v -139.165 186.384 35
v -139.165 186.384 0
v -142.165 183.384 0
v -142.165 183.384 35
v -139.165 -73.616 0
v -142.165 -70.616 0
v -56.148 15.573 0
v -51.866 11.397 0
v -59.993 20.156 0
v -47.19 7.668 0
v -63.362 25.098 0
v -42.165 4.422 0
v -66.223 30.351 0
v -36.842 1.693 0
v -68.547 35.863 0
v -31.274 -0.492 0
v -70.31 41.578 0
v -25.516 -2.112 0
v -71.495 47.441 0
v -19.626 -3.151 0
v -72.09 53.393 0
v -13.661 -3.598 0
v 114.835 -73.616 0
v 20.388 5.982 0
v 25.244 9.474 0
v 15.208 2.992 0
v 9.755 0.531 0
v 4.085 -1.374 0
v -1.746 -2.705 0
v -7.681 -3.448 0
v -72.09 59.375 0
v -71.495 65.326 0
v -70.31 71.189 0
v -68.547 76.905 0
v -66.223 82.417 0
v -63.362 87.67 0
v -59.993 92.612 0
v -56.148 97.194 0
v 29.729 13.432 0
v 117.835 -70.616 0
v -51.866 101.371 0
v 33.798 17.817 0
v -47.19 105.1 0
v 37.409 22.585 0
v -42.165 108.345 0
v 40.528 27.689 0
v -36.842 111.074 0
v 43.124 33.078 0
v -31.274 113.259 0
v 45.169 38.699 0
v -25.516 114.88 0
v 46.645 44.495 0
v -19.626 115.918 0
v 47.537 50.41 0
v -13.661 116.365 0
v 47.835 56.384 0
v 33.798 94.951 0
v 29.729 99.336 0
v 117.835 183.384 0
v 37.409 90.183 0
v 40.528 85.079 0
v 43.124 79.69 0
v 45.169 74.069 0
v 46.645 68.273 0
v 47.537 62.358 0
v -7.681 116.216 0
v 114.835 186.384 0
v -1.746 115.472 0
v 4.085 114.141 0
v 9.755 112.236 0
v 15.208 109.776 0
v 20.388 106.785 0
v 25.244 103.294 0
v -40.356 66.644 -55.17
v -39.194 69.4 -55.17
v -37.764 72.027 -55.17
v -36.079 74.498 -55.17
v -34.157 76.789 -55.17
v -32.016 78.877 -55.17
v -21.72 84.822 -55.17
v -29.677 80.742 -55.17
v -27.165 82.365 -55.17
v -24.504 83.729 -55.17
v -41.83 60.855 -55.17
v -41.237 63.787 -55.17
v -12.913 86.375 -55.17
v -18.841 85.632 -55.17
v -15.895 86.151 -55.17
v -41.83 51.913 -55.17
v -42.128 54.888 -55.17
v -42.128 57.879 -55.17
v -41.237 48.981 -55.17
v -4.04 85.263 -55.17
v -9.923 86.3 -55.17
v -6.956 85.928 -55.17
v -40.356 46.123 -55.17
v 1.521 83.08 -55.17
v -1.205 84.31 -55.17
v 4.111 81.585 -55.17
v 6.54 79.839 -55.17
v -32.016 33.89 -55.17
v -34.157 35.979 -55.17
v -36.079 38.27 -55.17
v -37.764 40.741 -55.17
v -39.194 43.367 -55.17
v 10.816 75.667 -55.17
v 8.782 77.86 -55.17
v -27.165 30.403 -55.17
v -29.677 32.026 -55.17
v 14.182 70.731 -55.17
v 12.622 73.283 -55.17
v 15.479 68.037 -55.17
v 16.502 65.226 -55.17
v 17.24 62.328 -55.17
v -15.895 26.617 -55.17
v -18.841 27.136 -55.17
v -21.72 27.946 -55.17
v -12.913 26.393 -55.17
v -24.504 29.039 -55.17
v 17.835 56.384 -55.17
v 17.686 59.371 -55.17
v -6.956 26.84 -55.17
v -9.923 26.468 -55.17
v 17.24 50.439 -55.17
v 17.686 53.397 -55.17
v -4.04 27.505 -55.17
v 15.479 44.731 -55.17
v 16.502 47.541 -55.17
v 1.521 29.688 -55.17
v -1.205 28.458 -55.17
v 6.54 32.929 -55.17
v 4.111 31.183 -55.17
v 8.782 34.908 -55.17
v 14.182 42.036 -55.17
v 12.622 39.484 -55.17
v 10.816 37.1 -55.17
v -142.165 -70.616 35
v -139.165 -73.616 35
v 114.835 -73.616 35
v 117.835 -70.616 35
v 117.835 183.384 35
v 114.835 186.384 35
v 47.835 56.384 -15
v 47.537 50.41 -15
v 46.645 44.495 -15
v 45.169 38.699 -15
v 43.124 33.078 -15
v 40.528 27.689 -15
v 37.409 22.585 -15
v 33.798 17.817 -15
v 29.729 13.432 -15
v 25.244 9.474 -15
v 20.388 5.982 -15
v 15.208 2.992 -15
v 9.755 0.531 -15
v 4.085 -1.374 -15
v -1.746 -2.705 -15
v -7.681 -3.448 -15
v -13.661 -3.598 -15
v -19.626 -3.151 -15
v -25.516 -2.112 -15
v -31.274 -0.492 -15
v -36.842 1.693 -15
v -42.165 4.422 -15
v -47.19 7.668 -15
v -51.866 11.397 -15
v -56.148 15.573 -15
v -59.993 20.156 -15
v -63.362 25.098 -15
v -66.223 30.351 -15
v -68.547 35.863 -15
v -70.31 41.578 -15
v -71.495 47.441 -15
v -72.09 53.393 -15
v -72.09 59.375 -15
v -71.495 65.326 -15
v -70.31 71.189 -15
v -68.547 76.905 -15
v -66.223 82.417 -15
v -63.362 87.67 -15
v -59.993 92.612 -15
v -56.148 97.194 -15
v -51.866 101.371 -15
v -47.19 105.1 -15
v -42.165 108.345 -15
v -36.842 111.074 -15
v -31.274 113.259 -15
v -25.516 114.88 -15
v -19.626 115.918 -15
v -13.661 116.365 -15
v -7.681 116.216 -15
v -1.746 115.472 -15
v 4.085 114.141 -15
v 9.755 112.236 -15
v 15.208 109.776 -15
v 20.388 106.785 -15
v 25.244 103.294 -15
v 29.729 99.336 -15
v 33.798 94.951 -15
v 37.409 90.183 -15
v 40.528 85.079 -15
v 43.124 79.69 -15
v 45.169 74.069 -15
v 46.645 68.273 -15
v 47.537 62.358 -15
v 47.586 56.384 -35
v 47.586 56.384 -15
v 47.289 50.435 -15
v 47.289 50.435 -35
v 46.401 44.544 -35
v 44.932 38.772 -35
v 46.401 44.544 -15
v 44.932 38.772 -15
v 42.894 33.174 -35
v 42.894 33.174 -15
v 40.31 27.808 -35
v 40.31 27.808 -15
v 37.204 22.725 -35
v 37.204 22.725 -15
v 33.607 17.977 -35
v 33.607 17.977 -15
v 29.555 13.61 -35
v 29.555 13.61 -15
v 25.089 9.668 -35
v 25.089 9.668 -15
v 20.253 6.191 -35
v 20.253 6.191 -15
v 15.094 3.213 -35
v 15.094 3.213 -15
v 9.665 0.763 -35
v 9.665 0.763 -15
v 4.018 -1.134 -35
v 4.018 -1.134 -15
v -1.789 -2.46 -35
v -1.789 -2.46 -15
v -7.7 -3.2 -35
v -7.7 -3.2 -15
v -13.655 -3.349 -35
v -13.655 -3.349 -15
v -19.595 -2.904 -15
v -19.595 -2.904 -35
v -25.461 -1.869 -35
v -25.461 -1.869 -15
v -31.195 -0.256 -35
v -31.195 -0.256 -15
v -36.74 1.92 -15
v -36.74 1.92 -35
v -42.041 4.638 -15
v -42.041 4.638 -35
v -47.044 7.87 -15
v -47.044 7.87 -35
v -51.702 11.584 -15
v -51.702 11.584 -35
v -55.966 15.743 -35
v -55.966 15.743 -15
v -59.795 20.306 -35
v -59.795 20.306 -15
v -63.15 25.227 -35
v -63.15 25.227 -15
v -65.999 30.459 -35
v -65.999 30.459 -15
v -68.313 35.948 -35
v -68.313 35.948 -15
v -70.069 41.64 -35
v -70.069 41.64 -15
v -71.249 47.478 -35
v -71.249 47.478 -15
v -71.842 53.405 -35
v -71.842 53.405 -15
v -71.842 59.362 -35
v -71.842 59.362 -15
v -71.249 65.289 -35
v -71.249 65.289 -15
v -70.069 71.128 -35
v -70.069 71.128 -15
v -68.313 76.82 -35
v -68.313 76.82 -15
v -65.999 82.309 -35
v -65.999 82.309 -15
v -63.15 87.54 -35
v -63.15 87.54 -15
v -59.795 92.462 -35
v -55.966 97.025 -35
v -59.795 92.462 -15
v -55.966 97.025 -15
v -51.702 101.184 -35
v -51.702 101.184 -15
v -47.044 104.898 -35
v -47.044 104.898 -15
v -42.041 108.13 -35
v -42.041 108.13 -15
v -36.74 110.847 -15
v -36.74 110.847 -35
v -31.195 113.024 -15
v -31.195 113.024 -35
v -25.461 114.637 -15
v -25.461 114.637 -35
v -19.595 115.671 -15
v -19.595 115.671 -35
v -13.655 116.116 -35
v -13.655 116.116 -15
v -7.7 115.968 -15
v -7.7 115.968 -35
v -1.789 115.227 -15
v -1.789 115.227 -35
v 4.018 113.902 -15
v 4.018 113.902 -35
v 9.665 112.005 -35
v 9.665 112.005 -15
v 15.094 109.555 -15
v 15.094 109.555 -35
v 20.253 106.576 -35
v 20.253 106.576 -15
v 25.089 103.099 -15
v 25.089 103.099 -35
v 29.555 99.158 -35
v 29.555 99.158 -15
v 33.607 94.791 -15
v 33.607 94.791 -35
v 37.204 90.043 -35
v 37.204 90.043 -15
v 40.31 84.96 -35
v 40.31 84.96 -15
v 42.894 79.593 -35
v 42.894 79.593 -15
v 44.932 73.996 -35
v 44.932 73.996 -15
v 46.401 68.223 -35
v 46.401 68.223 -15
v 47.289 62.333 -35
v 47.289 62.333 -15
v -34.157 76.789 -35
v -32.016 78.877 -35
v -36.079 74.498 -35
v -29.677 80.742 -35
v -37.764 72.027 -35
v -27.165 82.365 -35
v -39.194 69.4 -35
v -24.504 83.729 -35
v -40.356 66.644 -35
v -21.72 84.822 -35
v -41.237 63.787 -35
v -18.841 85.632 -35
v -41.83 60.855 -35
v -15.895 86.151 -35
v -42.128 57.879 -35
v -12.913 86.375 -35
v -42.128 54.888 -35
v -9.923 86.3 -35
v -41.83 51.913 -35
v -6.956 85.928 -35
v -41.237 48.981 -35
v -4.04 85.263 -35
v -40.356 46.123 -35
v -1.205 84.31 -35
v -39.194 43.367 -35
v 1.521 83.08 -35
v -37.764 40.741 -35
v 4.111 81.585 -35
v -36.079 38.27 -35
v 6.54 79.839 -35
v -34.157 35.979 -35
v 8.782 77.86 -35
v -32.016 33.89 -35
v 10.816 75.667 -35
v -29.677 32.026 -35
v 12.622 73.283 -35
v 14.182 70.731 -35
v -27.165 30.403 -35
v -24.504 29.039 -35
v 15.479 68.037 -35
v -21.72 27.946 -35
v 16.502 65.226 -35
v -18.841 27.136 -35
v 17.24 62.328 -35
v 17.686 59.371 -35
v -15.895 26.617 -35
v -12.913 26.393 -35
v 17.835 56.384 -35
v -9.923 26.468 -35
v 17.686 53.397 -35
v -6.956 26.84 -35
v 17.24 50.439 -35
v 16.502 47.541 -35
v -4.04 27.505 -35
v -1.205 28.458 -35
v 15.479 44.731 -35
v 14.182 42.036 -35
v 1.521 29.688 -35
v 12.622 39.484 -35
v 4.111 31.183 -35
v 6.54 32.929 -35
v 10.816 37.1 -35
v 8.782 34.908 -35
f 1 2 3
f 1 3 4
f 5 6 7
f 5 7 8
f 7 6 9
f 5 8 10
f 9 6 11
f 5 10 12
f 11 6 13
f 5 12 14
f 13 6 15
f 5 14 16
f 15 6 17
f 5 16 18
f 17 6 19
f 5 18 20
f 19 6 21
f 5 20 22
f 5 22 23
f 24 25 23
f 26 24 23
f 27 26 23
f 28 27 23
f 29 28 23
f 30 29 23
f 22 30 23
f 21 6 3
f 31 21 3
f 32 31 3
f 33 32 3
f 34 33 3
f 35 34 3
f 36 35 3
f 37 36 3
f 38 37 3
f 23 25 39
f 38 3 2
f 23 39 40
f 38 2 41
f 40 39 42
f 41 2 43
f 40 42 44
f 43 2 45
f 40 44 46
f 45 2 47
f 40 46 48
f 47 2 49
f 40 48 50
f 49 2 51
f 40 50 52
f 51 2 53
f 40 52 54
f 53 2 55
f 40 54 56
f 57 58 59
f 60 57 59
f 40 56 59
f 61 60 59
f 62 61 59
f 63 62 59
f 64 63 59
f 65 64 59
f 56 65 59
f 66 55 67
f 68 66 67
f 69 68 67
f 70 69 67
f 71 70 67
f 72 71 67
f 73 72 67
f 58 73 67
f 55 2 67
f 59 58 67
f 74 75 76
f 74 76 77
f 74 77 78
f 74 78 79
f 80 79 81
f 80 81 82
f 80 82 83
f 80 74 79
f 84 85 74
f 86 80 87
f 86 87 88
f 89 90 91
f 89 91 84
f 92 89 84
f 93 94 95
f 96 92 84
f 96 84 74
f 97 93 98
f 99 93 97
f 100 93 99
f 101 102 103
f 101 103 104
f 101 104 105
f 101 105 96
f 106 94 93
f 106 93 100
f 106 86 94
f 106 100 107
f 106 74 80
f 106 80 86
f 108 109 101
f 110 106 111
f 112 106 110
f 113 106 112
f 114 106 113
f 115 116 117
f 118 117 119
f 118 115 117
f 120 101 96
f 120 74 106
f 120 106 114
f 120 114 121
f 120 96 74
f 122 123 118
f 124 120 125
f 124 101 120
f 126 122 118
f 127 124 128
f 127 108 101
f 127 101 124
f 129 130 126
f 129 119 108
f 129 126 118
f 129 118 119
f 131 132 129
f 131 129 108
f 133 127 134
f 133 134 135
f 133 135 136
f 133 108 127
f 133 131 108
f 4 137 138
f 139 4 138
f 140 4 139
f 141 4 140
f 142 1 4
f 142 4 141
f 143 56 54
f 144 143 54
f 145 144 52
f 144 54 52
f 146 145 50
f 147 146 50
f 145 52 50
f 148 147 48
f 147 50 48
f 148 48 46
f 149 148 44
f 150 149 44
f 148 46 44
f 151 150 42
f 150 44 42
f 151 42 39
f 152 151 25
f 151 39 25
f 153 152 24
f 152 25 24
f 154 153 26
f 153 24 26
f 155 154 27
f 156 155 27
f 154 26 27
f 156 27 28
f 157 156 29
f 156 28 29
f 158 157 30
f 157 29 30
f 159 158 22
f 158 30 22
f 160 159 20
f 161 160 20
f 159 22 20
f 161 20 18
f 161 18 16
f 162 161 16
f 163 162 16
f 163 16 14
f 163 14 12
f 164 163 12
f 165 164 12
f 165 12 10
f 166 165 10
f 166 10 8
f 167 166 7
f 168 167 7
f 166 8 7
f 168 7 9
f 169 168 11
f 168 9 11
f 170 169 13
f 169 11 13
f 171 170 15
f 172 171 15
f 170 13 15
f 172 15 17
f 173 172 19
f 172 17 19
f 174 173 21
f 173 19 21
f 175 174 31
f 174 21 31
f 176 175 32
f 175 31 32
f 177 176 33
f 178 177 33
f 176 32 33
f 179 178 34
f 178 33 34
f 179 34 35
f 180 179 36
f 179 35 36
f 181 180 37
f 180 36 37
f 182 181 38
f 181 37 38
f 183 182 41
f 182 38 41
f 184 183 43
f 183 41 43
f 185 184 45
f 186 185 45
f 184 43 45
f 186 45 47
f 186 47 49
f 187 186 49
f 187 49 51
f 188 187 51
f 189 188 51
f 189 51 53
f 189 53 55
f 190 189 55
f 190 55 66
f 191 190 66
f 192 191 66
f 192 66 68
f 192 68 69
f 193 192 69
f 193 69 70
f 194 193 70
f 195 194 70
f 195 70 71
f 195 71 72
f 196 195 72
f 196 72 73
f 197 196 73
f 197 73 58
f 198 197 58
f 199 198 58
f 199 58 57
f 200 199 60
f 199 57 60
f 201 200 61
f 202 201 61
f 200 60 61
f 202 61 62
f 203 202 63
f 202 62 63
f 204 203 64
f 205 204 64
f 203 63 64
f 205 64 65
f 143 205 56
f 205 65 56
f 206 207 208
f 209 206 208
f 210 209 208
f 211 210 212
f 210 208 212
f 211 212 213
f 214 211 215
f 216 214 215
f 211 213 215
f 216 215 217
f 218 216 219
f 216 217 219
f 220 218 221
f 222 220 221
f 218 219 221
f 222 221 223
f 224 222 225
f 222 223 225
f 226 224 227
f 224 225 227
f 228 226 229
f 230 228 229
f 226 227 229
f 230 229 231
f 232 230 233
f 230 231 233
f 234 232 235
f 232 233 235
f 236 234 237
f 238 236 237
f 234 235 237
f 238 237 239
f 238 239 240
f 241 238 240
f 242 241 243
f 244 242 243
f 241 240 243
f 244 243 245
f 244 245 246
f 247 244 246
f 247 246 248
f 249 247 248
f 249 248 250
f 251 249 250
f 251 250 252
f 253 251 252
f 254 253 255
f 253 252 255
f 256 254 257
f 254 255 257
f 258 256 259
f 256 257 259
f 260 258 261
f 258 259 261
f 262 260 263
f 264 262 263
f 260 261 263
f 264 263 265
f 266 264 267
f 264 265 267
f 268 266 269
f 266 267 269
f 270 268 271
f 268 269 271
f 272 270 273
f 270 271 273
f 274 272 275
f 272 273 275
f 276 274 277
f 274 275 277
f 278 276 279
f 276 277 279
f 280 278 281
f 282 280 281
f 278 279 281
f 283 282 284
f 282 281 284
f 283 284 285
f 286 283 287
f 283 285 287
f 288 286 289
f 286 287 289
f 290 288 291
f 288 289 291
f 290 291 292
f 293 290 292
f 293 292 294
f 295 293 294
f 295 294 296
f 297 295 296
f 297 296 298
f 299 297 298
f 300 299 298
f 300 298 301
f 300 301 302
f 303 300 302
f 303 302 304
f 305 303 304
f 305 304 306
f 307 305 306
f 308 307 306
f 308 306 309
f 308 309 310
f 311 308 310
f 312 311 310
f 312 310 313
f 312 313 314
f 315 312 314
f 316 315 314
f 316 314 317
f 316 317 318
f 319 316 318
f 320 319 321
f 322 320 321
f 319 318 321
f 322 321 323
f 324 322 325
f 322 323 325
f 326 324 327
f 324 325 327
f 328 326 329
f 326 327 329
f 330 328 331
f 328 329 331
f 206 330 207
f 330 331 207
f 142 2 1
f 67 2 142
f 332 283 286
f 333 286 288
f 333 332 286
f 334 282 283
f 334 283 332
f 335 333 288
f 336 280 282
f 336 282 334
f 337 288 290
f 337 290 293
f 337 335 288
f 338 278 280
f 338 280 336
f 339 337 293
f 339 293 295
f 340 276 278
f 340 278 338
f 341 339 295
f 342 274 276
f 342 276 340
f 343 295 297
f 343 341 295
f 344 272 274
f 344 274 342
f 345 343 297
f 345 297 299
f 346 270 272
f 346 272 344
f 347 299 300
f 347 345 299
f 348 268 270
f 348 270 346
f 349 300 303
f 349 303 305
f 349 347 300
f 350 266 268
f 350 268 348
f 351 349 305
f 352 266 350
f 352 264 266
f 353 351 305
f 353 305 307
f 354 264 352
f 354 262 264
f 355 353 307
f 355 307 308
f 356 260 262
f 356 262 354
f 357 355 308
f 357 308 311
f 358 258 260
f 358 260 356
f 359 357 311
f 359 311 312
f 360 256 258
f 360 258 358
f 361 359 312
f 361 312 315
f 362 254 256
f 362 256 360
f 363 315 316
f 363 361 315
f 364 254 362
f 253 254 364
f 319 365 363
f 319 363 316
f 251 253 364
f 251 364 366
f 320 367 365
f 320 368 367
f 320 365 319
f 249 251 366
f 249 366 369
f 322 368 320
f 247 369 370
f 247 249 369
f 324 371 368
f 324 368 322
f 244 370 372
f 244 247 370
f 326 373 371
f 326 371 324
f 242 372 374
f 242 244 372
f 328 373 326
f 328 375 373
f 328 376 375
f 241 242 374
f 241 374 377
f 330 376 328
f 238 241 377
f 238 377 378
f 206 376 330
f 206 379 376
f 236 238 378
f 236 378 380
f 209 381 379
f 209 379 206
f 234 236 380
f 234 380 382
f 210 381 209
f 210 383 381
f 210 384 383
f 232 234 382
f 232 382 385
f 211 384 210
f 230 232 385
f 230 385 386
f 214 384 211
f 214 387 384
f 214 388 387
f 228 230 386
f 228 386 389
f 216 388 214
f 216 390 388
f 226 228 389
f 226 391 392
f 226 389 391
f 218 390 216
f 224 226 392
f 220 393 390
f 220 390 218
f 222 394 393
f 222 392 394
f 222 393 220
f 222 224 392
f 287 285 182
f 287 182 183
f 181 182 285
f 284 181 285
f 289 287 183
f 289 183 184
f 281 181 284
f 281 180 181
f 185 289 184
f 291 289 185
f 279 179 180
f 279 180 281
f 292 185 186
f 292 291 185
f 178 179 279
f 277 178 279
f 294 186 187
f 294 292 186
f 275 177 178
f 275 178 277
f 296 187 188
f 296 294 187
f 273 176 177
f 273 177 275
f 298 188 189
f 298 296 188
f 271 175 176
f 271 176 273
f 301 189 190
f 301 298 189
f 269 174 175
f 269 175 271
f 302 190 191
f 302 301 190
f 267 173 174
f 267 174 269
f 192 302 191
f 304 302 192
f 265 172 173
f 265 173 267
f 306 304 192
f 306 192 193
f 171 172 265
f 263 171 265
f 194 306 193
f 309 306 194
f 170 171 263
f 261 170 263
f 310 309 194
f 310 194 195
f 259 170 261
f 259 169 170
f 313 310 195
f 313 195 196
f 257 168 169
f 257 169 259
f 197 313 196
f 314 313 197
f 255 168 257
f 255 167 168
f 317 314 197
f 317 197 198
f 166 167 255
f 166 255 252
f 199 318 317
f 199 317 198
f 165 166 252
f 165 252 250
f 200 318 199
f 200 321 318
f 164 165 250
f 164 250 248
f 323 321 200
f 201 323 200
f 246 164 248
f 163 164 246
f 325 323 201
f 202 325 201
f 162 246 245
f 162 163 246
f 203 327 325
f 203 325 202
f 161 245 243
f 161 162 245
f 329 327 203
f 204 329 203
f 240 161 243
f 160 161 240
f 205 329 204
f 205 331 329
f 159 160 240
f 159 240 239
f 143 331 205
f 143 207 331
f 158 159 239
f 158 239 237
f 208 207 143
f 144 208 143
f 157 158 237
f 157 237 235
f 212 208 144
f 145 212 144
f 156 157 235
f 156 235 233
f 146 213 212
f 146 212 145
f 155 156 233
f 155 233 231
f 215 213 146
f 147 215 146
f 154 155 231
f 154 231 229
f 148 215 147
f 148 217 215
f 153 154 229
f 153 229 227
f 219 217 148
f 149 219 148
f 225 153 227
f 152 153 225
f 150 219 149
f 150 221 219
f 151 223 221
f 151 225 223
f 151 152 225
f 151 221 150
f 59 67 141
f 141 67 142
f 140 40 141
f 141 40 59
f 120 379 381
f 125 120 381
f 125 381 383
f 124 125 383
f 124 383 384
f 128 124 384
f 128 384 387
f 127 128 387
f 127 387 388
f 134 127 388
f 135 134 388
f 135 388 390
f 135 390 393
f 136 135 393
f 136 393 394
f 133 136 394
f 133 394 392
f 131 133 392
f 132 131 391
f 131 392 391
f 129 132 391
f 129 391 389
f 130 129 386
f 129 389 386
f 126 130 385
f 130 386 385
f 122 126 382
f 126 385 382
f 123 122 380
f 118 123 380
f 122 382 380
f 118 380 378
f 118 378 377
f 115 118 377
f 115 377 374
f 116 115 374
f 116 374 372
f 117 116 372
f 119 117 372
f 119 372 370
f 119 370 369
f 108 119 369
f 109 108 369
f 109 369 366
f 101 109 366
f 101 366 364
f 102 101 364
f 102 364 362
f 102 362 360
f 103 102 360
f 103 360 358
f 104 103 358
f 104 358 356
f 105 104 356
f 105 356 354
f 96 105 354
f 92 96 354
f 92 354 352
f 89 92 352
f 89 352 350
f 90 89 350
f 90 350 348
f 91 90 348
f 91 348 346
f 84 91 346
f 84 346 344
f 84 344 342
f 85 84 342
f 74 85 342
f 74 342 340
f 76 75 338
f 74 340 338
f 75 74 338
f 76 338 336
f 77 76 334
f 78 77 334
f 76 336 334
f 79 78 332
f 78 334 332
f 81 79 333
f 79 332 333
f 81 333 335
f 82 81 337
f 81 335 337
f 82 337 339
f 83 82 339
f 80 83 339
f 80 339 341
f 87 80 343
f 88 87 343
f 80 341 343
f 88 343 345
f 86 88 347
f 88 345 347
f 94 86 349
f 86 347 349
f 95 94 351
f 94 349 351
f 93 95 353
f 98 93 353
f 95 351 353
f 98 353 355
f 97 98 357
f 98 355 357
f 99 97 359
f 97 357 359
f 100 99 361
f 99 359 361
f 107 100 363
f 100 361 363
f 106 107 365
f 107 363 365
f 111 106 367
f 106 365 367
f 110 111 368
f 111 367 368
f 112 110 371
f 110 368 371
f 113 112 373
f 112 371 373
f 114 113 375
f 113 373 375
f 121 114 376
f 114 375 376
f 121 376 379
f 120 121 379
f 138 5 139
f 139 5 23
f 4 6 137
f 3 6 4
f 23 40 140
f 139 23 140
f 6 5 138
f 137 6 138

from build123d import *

# Parameters (mm, degrees)
F0_W     = 260
F0_H     = 260
F1_DEPTH = 35
F2_SIZE  = 3
F3_R     = 60
F4_DEPTH = 15
F5_R     = 59.7511721788
F5_R_2   = 30
F6_DEPTH = 20
F7_DEPTH = 7
F8_DEPTH = 33.17


with BuildPart() as f1:
    # F0 (on Top) → F1 (new body)
    with BuildSketch(Plane.XY):
        with Locations((-12.1650248766, 56.3838380575)):
            Rectangle(F0_W, F0_H)
    extrude(amount=F1_DEPTH)

    # F2
    f2_edges = [f1.edges().sort_by_distance(p)[0] for p in [
        (117.834975, -73.616162, 17.5),
        (117.834975, 186.383838, 17.5),
        (-142.165025, 186.383838, 17.5),
        (-142.165025, -73.616162, 17.5),
    ]]
    chamfer(f2_edges, length=F2_SIZE)

    # F3 (on face) → F4 (join)
    with BuildSketch(Plane(origin=(0, 0, 0), x_dir=(1, 0, 0), z_dir=(0, 0, -1))):
        with Locations((-12.1650248766, -56.3838380575)):
            Circle(F3_R)
    extrude(amount=F4_DEPTH)

    # F5 (on face) → F6 (join)
    with BuildSketch(Plane(origin=(0, 0, -15), x_dir=(1, 0, 0), z_dir=(0, 0, -1))):
        with Locations((-12.1650248766, -56.3838380575)):
            Circle(F5_R)
        with Locations((-12.1650248766, -56.3838380575)):
            Circle(F5_R_2, mode=Mode.SUBTRACT)
    extrude(amount=F6_DEPTH)

    # F7 (add): a face of the model
    f7_faces = [f1.faces().sort_by_distance(p)[0] for p in [
        (-12.1650248766, 56.3838380575, -15),
    ]]
    extrude(f7_faces, amount=F7_DEPTH)

    # F8 (add): a face of the model
    f8_faces = [f1.faces().sort_by_distance(p)[0] for p in [
        (-12.1650248766, 56.3838380575, -22),
    ]]
    extrude(f8_faces, amount=F8_DEPTH)


solid = f1.part
